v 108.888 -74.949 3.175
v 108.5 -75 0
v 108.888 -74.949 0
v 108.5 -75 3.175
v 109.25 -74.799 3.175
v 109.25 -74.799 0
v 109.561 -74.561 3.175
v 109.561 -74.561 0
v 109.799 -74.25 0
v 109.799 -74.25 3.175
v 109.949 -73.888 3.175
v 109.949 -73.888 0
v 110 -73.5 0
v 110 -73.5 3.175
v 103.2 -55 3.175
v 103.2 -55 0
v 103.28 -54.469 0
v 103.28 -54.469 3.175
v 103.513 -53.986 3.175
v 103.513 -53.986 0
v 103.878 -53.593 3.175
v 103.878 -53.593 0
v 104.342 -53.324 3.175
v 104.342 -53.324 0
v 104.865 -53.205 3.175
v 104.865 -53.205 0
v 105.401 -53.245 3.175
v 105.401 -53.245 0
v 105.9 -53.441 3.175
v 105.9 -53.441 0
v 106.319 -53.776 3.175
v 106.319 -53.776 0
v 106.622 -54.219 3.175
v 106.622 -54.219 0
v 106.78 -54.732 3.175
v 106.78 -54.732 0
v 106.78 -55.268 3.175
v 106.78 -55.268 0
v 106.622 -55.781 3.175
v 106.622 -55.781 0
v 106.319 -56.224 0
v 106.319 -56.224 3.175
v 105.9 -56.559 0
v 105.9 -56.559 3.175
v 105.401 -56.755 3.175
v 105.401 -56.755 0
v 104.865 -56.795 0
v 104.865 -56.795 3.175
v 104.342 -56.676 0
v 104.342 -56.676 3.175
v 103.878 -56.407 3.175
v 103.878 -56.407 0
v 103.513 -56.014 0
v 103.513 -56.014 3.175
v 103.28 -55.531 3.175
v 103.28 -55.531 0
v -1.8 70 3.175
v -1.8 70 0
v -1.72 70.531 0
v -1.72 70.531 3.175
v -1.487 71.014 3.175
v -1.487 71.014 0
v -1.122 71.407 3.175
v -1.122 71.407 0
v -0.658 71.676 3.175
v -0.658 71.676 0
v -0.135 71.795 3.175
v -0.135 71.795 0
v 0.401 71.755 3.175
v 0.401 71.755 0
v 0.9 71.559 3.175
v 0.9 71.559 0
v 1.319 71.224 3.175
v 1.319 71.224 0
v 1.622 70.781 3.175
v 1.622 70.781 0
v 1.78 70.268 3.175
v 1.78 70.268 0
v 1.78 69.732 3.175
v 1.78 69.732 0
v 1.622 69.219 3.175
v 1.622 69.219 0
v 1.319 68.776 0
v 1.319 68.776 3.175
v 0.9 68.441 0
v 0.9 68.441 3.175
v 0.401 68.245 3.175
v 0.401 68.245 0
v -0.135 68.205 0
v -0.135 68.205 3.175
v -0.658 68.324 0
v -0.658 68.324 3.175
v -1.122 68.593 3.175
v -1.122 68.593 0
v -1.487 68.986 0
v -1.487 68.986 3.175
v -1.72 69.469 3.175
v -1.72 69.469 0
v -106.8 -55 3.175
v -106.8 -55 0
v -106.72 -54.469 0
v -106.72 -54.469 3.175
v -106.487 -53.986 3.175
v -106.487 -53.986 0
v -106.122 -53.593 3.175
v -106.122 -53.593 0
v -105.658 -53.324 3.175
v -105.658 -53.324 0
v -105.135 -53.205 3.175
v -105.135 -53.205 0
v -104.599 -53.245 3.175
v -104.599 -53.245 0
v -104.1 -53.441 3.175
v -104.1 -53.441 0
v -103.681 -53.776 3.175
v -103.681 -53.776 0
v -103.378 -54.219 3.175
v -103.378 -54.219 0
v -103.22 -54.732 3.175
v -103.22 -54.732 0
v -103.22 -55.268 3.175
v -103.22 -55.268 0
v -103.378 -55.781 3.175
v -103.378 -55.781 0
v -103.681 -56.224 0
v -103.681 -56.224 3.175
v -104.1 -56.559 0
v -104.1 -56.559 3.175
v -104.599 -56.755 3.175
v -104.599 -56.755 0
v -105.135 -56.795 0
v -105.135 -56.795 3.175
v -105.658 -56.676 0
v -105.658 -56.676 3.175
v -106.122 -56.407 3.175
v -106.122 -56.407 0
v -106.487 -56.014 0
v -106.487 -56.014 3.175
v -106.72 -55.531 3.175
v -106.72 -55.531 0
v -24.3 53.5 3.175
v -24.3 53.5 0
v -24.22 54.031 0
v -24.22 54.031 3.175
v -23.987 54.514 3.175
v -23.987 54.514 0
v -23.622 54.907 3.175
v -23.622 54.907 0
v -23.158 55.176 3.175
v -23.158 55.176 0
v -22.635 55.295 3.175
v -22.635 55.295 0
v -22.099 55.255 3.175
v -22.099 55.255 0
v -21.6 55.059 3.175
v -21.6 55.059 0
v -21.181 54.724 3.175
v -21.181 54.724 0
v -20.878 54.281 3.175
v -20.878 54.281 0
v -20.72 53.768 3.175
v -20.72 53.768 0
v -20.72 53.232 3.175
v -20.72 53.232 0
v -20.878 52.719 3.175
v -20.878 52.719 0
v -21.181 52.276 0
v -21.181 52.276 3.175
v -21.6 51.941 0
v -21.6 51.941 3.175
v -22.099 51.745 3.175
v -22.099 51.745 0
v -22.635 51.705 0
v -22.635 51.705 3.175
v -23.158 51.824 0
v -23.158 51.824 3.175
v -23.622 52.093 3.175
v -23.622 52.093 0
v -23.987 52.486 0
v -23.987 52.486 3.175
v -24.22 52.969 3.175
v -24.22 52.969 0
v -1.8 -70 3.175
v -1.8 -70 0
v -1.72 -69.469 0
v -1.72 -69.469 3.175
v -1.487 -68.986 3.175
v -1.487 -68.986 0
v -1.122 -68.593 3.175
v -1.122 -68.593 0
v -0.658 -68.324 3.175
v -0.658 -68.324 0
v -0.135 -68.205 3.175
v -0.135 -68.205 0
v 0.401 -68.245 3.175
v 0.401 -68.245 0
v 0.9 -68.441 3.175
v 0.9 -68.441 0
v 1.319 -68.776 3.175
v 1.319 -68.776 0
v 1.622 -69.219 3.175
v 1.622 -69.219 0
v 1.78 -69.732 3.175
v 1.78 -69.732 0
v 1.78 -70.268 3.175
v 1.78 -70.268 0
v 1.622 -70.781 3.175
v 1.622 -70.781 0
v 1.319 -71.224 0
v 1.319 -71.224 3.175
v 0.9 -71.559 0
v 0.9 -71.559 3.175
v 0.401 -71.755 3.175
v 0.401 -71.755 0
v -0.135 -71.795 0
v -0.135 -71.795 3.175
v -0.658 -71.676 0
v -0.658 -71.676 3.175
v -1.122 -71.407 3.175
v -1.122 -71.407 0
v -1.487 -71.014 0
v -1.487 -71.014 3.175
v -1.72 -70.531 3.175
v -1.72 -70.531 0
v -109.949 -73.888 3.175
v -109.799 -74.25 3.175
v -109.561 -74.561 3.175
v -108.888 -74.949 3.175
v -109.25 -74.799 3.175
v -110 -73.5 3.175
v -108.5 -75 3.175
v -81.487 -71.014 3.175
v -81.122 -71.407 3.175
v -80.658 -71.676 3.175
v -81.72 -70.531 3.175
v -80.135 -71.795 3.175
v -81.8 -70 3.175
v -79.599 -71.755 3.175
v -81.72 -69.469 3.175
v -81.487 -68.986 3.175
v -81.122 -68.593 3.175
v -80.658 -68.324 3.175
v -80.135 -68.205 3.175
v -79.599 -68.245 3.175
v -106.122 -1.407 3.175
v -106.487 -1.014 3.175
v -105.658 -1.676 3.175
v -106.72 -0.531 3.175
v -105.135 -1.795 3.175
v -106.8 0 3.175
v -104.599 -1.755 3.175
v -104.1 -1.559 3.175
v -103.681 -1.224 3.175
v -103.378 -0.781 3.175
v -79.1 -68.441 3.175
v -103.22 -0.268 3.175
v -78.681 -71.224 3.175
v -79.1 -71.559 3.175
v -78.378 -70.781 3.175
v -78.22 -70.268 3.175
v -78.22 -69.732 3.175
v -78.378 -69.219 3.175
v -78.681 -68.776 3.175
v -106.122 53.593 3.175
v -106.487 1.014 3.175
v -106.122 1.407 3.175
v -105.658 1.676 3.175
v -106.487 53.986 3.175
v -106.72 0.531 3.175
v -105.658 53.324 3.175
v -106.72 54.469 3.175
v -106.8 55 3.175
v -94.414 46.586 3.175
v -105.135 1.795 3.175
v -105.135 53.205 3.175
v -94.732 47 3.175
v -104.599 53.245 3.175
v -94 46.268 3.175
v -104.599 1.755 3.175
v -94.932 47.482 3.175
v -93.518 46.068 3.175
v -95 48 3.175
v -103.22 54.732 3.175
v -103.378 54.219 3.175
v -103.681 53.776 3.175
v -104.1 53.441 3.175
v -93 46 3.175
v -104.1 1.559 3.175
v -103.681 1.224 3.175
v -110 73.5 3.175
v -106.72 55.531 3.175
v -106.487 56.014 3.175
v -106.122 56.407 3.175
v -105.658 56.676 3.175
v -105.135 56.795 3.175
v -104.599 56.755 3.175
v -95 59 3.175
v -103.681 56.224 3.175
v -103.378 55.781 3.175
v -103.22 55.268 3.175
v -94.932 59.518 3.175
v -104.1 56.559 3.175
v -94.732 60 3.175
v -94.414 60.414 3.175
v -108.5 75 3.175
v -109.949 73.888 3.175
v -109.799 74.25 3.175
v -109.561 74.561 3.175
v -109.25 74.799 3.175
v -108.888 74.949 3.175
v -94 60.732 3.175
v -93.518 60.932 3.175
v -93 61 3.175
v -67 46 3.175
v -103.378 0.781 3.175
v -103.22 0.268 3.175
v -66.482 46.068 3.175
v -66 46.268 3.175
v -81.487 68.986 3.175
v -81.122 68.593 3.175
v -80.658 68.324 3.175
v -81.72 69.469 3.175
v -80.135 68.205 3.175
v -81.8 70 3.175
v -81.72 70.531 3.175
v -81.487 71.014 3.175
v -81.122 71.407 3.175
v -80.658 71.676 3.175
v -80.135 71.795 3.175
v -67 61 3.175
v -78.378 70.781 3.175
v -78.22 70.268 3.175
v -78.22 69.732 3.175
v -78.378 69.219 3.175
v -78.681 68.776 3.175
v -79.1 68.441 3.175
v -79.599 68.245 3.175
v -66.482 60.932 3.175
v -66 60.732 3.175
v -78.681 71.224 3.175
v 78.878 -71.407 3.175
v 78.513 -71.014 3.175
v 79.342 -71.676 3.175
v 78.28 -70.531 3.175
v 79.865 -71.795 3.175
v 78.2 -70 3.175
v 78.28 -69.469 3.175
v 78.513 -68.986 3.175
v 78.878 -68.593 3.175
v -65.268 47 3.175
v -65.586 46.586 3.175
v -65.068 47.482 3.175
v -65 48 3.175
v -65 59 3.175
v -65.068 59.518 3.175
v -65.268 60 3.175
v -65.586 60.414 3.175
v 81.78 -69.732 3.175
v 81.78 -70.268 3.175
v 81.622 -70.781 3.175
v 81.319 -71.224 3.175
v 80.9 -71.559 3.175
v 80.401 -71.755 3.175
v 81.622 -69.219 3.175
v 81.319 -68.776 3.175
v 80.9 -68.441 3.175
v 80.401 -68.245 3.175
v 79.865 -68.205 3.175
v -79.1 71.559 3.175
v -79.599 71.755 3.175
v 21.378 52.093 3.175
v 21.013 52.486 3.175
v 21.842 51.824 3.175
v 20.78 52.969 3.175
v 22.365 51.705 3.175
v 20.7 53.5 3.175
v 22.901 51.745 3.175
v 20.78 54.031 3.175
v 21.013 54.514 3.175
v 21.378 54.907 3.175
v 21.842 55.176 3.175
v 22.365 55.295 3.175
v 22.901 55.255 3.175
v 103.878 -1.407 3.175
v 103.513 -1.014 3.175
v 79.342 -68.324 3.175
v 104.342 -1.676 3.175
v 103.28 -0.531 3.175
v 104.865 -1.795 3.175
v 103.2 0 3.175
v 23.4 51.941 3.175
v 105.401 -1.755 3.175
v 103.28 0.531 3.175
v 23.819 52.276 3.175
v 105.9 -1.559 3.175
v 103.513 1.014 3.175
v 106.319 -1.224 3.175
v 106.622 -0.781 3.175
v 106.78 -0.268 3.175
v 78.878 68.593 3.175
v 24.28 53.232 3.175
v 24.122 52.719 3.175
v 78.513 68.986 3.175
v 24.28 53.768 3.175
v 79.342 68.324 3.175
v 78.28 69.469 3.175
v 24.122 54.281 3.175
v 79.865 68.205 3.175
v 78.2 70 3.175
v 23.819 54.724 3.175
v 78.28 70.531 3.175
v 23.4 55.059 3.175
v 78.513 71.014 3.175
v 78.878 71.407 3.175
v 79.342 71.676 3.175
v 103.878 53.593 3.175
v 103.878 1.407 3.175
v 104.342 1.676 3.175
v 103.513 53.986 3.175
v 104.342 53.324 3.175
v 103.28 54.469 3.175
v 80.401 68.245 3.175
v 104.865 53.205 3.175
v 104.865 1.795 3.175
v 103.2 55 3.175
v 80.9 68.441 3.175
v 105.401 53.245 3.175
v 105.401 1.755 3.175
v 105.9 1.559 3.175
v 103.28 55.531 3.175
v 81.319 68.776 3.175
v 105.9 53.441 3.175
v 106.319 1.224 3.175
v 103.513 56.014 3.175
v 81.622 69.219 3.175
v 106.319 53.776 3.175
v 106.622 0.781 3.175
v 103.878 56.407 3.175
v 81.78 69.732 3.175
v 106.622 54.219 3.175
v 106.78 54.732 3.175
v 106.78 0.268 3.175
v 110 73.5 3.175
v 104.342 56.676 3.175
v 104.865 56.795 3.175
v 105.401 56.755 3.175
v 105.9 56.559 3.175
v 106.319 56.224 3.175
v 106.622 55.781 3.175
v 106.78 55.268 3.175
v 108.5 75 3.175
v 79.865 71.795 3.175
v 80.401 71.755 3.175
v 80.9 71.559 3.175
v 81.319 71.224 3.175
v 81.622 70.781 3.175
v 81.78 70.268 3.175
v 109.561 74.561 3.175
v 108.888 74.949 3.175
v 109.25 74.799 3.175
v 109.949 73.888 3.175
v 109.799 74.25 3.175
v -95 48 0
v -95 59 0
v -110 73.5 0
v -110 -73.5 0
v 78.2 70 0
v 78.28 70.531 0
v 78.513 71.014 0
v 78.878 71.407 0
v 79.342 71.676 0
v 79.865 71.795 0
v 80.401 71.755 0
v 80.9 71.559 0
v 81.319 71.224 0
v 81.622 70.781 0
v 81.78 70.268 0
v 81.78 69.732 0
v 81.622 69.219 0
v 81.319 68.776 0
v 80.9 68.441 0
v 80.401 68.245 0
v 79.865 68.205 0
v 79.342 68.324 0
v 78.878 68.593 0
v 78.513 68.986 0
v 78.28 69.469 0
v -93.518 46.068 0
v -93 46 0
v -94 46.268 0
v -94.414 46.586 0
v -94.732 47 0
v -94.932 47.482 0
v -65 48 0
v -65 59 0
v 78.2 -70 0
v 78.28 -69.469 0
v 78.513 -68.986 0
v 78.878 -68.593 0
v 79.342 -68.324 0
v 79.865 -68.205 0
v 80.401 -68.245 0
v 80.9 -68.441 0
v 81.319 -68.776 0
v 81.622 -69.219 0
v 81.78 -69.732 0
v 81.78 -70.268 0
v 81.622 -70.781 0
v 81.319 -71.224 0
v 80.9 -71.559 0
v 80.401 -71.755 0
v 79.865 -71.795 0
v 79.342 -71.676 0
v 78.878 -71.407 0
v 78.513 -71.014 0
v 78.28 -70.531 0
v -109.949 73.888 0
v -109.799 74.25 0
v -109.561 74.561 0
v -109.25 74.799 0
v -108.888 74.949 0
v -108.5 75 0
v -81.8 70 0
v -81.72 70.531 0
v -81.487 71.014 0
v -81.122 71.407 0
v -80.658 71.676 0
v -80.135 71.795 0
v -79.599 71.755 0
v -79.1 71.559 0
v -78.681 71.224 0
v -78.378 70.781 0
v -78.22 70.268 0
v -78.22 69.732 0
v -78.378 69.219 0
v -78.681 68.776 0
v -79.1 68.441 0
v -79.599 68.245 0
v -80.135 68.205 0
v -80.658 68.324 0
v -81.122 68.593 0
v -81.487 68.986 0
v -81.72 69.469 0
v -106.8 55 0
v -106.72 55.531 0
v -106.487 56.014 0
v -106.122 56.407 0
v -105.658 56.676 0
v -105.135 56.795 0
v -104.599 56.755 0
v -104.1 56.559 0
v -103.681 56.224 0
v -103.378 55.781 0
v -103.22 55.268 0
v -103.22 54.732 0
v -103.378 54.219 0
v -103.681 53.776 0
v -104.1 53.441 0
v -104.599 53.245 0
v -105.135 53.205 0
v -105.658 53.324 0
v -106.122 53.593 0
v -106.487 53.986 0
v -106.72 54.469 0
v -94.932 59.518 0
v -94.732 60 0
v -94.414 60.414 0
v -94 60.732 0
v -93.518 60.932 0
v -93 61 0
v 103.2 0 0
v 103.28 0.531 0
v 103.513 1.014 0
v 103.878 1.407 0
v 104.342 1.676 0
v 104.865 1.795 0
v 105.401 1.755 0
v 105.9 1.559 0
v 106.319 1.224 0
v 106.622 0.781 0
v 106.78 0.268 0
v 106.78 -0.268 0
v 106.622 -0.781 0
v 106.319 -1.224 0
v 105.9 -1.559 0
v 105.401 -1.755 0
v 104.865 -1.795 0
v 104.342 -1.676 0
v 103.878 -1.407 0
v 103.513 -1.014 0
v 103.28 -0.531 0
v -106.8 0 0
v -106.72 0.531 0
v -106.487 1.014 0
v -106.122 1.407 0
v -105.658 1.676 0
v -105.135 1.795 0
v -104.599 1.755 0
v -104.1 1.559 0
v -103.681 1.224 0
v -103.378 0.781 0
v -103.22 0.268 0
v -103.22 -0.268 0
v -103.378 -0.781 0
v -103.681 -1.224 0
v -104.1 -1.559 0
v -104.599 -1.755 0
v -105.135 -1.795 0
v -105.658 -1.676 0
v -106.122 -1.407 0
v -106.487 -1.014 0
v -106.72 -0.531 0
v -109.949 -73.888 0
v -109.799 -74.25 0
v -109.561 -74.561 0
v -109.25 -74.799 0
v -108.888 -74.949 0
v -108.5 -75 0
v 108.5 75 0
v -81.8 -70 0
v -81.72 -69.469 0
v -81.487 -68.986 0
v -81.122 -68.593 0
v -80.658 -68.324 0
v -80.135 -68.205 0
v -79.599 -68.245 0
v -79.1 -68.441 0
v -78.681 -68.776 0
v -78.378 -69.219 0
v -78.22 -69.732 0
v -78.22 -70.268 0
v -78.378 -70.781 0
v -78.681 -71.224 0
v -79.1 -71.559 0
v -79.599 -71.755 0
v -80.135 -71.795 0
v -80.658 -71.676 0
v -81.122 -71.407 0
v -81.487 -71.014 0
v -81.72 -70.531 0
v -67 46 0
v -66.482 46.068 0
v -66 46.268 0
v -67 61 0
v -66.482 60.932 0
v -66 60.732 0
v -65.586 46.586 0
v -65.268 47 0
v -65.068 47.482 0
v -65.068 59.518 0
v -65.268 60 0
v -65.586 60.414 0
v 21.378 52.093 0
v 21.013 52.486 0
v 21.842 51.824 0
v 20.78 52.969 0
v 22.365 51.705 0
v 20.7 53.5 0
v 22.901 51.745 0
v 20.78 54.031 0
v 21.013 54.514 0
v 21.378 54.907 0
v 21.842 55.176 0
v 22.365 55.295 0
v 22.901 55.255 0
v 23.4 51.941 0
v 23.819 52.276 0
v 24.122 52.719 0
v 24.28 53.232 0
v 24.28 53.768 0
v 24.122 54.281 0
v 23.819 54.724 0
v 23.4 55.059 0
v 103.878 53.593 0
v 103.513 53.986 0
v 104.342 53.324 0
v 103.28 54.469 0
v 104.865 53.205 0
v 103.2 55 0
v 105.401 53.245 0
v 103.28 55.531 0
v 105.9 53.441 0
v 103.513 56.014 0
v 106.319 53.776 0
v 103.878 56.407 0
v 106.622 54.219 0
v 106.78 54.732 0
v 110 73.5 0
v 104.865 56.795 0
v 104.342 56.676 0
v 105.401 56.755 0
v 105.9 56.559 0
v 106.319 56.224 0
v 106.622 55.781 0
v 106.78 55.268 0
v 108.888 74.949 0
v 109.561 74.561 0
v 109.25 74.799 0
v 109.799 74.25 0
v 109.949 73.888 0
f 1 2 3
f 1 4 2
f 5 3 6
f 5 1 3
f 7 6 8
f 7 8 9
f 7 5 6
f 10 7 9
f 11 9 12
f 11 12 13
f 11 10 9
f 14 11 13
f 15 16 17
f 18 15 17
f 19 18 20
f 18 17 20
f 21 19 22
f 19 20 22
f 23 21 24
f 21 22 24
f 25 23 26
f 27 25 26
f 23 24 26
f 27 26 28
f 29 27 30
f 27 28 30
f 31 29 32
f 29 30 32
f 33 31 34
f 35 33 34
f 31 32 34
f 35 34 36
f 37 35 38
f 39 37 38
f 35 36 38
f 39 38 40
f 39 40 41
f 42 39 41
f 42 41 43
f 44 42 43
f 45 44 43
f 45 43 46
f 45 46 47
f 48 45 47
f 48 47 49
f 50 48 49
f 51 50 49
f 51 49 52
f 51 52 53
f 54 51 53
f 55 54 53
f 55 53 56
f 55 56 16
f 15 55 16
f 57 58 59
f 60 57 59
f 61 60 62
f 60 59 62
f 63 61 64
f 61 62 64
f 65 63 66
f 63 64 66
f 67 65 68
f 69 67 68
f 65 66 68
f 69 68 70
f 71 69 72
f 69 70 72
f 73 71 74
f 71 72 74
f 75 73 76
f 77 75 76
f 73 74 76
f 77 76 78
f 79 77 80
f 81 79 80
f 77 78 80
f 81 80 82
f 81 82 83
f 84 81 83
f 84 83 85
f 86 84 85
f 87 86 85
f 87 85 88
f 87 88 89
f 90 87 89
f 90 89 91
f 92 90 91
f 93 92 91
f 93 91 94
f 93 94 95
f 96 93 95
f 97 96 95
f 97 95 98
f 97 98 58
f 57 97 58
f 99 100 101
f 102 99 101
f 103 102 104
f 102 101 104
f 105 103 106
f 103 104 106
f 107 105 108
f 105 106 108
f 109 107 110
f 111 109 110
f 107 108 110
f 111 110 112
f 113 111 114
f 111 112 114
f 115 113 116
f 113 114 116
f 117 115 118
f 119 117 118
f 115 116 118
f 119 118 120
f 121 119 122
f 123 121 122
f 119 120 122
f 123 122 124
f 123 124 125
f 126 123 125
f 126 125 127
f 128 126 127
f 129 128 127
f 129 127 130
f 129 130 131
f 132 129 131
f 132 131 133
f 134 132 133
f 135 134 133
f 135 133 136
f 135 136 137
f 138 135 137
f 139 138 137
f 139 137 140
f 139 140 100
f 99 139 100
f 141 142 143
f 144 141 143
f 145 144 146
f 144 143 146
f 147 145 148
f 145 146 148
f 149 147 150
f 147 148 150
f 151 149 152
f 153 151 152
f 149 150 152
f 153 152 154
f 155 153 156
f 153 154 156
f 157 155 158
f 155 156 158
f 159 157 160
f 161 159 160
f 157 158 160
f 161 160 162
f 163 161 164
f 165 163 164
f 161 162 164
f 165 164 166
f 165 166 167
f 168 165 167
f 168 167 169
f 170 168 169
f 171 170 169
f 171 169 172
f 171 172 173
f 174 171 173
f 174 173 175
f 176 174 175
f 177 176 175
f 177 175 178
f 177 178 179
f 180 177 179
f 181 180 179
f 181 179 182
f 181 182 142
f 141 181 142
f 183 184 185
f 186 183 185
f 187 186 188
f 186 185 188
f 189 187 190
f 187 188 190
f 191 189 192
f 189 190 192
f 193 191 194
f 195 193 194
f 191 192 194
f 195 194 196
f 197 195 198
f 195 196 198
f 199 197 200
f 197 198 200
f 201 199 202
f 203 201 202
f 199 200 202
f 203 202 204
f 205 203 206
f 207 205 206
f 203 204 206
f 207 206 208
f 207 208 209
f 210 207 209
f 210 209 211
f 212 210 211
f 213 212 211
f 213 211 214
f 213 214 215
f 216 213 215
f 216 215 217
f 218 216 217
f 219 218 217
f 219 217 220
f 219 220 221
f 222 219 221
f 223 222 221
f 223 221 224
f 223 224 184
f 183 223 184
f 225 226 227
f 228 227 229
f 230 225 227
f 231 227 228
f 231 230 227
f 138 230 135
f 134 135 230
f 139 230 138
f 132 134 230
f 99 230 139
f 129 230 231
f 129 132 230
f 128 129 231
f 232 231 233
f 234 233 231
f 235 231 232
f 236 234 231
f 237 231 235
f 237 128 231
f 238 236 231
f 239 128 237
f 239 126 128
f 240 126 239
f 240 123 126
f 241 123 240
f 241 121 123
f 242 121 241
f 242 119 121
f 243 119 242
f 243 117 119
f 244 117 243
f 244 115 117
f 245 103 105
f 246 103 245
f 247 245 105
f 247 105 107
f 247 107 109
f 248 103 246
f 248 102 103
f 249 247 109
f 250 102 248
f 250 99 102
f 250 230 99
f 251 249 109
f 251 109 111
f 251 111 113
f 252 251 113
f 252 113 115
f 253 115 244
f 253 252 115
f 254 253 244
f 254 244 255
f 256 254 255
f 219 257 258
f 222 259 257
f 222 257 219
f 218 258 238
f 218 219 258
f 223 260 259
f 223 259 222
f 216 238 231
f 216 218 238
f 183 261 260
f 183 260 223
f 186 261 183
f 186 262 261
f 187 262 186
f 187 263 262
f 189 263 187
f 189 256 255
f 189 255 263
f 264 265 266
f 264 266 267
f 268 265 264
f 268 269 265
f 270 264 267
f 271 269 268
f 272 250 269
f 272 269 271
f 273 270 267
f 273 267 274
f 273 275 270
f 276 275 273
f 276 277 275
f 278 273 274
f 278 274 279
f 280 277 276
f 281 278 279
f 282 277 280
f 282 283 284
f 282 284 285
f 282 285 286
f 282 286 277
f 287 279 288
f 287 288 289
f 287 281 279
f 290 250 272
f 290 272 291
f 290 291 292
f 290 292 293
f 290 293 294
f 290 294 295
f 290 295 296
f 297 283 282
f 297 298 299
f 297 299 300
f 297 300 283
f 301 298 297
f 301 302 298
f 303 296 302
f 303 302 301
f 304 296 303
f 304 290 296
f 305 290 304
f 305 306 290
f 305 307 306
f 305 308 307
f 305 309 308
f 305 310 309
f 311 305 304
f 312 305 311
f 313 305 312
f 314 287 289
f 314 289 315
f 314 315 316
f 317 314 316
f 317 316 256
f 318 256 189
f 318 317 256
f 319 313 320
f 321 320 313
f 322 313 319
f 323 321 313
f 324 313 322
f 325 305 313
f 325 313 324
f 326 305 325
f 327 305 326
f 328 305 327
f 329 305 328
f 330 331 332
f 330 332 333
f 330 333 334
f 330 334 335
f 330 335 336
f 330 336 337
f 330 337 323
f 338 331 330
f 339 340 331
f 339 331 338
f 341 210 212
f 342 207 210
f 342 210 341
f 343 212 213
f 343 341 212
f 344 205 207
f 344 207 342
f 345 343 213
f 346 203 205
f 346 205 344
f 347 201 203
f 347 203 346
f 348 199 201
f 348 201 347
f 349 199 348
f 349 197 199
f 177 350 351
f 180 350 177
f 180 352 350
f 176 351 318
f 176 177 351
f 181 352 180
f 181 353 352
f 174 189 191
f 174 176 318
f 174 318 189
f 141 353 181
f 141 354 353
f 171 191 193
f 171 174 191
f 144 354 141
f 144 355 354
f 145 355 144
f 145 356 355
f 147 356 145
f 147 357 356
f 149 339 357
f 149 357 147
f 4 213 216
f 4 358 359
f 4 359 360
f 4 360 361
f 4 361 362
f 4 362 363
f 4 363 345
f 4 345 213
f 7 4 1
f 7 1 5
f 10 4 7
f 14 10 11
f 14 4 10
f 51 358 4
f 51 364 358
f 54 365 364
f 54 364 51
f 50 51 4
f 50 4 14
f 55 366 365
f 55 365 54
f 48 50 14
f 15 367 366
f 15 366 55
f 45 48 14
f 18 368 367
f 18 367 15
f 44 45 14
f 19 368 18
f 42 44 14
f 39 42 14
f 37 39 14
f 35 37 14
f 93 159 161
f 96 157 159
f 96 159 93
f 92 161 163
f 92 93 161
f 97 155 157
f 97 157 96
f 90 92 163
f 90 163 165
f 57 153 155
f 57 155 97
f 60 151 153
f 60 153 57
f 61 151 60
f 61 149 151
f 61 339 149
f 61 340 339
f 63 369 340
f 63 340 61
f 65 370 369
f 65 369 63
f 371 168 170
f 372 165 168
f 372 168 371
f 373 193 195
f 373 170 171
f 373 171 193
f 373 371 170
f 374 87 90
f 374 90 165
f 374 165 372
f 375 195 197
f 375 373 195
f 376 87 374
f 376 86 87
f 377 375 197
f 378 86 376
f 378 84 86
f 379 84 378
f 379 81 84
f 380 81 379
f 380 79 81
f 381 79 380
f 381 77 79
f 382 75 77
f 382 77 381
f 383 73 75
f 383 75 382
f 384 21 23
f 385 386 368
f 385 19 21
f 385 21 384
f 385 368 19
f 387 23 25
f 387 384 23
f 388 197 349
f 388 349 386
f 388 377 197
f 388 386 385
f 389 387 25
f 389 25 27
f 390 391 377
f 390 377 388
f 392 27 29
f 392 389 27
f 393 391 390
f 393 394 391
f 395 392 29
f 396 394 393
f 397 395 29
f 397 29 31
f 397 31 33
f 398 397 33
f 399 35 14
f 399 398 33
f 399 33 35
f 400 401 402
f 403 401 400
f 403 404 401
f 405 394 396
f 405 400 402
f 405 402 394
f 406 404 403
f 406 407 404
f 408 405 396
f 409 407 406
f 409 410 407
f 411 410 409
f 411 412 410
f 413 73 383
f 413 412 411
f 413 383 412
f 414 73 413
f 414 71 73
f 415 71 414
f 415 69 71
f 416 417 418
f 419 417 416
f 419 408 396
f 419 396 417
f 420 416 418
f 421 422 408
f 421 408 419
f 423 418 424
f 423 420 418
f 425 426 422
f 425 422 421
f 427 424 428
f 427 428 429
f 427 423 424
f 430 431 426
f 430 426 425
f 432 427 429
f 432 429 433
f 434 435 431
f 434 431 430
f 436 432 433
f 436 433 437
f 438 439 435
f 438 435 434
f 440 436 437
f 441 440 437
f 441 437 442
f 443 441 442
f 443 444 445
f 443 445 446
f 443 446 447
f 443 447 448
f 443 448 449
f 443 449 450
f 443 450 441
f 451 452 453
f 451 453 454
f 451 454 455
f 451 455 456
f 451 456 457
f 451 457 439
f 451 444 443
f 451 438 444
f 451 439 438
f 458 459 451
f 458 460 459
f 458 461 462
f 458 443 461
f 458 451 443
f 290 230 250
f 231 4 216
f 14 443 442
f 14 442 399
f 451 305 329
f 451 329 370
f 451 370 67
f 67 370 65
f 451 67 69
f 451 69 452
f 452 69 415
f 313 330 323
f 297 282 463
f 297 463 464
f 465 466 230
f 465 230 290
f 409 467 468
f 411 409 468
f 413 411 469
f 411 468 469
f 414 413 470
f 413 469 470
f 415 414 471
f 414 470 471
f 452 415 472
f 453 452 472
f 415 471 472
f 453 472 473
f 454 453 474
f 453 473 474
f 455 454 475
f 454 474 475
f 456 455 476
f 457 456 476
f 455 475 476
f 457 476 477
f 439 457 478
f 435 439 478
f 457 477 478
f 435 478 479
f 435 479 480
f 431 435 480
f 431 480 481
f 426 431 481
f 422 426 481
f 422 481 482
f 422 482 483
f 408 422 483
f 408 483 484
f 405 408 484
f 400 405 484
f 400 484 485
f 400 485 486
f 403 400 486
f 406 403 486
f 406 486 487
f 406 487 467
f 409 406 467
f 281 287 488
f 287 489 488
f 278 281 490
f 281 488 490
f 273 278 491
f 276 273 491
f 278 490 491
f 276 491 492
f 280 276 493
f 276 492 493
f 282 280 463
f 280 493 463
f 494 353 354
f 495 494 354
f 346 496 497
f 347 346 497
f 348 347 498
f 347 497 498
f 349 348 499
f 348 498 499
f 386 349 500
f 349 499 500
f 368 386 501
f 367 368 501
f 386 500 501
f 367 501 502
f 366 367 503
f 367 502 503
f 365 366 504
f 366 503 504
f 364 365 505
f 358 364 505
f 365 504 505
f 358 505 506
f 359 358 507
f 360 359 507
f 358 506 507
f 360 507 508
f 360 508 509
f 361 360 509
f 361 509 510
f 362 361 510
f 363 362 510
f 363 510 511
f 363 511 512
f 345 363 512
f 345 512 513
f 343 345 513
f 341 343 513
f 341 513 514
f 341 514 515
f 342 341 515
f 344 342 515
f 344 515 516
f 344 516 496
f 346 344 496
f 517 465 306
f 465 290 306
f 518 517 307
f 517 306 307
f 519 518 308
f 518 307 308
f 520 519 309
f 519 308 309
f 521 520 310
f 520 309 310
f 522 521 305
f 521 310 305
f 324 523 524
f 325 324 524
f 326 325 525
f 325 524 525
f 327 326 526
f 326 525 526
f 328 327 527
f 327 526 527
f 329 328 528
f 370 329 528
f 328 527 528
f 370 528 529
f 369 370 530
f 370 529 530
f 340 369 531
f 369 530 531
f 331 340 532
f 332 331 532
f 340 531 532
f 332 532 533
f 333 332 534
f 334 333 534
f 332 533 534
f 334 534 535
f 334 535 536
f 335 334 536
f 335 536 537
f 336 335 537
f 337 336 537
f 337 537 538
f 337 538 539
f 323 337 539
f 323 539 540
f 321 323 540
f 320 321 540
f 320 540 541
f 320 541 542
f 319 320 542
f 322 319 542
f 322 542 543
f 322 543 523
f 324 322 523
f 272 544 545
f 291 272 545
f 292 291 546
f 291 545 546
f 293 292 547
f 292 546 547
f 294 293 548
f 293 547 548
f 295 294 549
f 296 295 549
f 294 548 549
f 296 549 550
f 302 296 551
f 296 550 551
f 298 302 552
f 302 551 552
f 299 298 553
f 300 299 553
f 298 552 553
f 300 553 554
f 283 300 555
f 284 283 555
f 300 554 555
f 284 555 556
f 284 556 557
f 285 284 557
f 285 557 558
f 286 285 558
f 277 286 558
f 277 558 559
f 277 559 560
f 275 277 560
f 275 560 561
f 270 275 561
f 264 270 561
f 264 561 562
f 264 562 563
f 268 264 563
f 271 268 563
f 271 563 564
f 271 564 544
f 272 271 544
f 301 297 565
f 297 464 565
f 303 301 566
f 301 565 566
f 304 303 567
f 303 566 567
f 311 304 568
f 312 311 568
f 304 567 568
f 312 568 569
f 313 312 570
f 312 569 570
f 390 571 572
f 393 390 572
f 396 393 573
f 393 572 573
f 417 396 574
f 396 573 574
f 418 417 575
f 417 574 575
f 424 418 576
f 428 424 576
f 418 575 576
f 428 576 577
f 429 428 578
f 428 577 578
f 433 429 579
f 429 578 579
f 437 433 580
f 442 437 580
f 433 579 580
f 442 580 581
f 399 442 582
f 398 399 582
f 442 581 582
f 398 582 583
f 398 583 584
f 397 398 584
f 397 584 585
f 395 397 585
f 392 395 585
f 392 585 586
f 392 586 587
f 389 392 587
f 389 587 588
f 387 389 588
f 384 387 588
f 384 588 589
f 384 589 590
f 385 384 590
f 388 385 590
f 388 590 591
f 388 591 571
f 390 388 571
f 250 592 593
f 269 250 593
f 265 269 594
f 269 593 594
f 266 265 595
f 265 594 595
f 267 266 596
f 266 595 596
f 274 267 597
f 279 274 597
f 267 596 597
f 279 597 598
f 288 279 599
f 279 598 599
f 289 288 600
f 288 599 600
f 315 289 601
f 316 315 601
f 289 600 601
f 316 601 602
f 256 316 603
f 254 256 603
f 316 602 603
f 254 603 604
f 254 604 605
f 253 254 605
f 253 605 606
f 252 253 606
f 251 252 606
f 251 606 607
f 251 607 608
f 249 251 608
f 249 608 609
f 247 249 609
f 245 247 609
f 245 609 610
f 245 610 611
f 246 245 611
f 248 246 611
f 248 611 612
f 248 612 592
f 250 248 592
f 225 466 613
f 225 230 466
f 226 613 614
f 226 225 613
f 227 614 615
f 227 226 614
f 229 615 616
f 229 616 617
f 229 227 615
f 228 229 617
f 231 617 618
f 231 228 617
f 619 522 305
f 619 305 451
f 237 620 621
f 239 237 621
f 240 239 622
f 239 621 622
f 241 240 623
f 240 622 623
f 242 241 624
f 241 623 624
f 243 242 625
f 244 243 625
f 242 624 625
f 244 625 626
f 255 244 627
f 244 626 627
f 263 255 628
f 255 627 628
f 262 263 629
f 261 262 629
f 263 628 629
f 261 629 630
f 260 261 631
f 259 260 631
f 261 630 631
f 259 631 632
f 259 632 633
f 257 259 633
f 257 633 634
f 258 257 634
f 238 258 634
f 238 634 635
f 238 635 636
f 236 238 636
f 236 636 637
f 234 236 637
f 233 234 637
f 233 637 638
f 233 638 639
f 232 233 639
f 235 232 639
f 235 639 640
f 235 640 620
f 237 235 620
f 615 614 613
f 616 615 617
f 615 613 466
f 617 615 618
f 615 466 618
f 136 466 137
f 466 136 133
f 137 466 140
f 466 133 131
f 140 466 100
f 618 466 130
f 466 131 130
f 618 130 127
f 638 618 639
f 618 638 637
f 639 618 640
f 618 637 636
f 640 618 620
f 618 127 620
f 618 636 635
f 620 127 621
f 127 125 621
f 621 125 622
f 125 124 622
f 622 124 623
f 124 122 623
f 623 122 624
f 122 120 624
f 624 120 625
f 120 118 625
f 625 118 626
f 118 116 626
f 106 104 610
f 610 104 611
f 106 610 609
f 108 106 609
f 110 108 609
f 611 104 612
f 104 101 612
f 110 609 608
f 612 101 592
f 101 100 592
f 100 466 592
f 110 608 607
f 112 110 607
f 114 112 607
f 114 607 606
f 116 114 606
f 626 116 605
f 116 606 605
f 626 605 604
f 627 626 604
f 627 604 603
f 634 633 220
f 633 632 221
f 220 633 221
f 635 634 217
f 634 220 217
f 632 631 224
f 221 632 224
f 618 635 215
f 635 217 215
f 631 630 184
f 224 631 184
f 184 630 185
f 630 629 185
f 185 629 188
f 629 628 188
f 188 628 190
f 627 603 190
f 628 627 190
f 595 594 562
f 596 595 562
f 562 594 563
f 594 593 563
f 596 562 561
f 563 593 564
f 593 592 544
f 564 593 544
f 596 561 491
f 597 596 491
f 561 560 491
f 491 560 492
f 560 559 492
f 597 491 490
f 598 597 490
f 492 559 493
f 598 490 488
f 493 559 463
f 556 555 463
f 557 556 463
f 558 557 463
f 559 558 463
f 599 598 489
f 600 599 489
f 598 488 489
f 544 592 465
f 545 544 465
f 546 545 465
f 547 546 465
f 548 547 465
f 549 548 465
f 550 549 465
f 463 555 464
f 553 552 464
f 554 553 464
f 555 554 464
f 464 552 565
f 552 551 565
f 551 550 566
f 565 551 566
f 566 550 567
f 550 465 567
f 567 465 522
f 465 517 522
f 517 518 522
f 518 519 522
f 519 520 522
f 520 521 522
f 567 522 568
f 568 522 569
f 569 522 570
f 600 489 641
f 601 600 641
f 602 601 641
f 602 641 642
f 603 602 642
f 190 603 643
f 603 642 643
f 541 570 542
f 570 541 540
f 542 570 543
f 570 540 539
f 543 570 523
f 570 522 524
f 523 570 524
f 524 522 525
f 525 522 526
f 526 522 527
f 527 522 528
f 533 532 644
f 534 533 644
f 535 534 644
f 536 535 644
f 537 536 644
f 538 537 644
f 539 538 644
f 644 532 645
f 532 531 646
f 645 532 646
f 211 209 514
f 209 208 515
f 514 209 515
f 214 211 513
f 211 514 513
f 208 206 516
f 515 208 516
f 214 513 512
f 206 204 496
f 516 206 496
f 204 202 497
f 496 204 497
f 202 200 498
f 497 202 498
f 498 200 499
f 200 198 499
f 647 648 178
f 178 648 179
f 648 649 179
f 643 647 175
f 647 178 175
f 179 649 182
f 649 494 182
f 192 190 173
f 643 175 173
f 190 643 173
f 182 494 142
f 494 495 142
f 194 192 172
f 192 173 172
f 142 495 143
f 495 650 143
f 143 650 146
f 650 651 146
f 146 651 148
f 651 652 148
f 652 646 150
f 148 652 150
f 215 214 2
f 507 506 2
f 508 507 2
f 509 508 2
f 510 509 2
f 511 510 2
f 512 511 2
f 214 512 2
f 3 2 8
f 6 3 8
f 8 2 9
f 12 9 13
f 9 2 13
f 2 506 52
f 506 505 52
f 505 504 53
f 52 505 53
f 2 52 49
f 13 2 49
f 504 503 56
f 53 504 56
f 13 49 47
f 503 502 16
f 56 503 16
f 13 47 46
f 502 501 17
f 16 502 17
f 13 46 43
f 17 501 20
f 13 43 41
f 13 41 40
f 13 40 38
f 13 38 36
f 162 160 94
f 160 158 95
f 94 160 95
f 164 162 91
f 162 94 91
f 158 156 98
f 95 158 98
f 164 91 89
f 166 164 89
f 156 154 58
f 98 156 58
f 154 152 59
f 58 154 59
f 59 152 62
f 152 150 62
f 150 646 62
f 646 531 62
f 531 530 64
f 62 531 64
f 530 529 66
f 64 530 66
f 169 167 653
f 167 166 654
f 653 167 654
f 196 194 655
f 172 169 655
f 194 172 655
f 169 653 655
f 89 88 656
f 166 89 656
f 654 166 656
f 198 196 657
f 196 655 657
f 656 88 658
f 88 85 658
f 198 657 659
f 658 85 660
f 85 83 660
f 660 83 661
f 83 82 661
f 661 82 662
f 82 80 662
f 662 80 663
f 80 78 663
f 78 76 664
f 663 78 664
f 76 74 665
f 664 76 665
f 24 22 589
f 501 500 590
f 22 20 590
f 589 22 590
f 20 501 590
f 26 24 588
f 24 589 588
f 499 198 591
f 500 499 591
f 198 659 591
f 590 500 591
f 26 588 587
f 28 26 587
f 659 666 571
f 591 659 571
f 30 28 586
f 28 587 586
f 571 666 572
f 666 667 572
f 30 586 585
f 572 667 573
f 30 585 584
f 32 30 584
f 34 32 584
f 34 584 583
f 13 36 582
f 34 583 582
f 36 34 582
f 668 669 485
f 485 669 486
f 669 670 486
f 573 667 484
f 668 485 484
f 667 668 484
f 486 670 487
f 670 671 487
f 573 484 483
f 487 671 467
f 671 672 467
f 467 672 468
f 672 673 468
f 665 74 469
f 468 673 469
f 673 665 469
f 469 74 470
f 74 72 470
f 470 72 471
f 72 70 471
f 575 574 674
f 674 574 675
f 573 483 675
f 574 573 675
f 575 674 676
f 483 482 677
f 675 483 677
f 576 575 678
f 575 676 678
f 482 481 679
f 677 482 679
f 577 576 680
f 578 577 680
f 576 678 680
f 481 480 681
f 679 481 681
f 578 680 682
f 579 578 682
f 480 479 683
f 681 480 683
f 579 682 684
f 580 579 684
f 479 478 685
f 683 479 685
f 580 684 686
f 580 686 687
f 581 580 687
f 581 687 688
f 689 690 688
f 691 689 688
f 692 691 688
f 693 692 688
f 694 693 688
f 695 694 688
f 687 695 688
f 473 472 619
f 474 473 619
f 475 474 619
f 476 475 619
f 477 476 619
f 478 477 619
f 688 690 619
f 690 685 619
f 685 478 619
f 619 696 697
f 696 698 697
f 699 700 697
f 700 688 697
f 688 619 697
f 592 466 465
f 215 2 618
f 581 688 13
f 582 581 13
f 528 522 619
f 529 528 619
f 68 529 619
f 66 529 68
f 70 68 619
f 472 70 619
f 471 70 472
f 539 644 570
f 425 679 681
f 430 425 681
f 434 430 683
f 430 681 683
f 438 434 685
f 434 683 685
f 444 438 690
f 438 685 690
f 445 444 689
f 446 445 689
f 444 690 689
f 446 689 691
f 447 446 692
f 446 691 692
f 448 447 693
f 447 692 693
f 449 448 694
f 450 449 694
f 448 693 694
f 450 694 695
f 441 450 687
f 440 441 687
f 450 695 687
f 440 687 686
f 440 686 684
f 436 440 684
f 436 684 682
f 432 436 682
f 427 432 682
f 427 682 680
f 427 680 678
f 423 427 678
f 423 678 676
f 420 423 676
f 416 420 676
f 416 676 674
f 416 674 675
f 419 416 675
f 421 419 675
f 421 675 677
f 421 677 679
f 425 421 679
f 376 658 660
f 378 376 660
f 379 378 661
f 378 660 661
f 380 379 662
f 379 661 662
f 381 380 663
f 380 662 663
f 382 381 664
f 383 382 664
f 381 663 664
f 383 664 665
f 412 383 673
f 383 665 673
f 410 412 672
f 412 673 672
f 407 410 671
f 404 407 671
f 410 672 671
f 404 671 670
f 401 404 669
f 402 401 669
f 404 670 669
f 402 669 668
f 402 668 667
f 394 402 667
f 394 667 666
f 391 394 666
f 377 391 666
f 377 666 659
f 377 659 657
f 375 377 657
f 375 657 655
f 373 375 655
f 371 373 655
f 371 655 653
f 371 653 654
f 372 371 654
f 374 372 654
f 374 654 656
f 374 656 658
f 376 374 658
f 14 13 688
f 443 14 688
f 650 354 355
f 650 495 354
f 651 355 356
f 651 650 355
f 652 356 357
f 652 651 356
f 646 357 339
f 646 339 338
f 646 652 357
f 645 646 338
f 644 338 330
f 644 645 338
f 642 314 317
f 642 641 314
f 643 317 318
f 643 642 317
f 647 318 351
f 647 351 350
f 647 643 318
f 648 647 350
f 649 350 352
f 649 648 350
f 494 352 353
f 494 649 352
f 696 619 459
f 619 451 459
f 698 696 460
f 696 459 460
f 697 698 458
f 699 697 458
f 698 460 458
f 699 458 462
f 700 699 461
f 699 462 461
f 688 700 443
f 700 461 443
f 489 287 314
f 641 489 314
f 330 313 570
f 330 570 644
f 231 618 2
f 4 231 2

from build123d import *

# Parameters (mm, degrees)
SKETCH1_W            = 220
SKETCH1_H            = 150
BOSS_EXTRUDE1_DEPTH  = 3.175
M3_CLEARANCE_HOLE1_D = 3.6
SKETCH4_W            = 10
SKETCH4_H            = 10
BOSS_EXTRUDE2_DEPTH  = 3.175
FILLET2_R            = 1.5
SKETCH7_W            = 30
SKETCH7_H            = 15
CUT_EXTRUDE2_DEPTH   = 4.175
M3_CLEARANCE_HOLE3_D = 3.6
FILLET3_R            = 2


with BuildPart() as part:
    # Sketch1 → Boss-Extrude1 (new body)
    with BuildSketch(Plane.XY):
        Rectangle(SKETCH1_W, SKETCH1_H)
    extrude(amount=BOSS_EXTRUDE1_DEPTH)

    # M3 Clearance Hole1 (through all)
    with Locations(Plane.XY.offset(3.175)):
        with Locations((0, 0), (-80, 70), (80, 70), (0, 70), (-105, 55), (-105, 0), (-105, -55), (-80, -70), (0, -70), (80, -70), (105, -55), (105, 0), (105, 55)):
            Hole(M3_CLEARANCE_HOLE1_D / 2)

    # Sketch4 → Boss-Extrude2 (add, through all)
    with BuildSketch(Plane.XY.offset(3.175)):
        Rectangle(SKETCH4_W, SKETCH4_H)
    extrude(amount=-BOSS_EXTRUDE2_DEPTH)

    # Fillet2
    fillet2_edges = [part.edges().sort_by_distance(p)[0] for p in [
        (-110, -75, 1.5875),
        (-110, 75, 1.5875),
        (110, 75, 1.5875),
        (110, -75, 1.5875),
    ]]
    fillet(fillet2_edges, radius=FILLET2_R)

    # Sketch7 → Cut-Extrude2 (cut, through all)
    with BuildSketch(Plane.XY.offset(3.175)):
        with Locations((-80, 53.5)):
            Rectangle(SKETCH7_W, SKETCH7_H)
    extrude(amount=-CUT_EXTRUDE2_DEPTH, mode=Mode.SUBTRACT)

    # M3 Clearance Hole3 (through all)
    with Locations(Plane.XY.offset(3.175)):
        with Locations((-22.5, 53.5), (22.5, 53.5)):
            Hole(M3_CLEARANCE_HOLE3_D / 2)

    # Fillet3
    fillet3_edges = [part.edges().sort_by_distance(p)[0] for p in [
        (-65, 61, 1.5875),
        (-65, 46, 1.5875),
        (-95, 46, 1.5875),
        (-95, 61, 1.5875),
    ]]
    fillet(fillet3_edges, radius=FILLET3_R)


solid = part.part
